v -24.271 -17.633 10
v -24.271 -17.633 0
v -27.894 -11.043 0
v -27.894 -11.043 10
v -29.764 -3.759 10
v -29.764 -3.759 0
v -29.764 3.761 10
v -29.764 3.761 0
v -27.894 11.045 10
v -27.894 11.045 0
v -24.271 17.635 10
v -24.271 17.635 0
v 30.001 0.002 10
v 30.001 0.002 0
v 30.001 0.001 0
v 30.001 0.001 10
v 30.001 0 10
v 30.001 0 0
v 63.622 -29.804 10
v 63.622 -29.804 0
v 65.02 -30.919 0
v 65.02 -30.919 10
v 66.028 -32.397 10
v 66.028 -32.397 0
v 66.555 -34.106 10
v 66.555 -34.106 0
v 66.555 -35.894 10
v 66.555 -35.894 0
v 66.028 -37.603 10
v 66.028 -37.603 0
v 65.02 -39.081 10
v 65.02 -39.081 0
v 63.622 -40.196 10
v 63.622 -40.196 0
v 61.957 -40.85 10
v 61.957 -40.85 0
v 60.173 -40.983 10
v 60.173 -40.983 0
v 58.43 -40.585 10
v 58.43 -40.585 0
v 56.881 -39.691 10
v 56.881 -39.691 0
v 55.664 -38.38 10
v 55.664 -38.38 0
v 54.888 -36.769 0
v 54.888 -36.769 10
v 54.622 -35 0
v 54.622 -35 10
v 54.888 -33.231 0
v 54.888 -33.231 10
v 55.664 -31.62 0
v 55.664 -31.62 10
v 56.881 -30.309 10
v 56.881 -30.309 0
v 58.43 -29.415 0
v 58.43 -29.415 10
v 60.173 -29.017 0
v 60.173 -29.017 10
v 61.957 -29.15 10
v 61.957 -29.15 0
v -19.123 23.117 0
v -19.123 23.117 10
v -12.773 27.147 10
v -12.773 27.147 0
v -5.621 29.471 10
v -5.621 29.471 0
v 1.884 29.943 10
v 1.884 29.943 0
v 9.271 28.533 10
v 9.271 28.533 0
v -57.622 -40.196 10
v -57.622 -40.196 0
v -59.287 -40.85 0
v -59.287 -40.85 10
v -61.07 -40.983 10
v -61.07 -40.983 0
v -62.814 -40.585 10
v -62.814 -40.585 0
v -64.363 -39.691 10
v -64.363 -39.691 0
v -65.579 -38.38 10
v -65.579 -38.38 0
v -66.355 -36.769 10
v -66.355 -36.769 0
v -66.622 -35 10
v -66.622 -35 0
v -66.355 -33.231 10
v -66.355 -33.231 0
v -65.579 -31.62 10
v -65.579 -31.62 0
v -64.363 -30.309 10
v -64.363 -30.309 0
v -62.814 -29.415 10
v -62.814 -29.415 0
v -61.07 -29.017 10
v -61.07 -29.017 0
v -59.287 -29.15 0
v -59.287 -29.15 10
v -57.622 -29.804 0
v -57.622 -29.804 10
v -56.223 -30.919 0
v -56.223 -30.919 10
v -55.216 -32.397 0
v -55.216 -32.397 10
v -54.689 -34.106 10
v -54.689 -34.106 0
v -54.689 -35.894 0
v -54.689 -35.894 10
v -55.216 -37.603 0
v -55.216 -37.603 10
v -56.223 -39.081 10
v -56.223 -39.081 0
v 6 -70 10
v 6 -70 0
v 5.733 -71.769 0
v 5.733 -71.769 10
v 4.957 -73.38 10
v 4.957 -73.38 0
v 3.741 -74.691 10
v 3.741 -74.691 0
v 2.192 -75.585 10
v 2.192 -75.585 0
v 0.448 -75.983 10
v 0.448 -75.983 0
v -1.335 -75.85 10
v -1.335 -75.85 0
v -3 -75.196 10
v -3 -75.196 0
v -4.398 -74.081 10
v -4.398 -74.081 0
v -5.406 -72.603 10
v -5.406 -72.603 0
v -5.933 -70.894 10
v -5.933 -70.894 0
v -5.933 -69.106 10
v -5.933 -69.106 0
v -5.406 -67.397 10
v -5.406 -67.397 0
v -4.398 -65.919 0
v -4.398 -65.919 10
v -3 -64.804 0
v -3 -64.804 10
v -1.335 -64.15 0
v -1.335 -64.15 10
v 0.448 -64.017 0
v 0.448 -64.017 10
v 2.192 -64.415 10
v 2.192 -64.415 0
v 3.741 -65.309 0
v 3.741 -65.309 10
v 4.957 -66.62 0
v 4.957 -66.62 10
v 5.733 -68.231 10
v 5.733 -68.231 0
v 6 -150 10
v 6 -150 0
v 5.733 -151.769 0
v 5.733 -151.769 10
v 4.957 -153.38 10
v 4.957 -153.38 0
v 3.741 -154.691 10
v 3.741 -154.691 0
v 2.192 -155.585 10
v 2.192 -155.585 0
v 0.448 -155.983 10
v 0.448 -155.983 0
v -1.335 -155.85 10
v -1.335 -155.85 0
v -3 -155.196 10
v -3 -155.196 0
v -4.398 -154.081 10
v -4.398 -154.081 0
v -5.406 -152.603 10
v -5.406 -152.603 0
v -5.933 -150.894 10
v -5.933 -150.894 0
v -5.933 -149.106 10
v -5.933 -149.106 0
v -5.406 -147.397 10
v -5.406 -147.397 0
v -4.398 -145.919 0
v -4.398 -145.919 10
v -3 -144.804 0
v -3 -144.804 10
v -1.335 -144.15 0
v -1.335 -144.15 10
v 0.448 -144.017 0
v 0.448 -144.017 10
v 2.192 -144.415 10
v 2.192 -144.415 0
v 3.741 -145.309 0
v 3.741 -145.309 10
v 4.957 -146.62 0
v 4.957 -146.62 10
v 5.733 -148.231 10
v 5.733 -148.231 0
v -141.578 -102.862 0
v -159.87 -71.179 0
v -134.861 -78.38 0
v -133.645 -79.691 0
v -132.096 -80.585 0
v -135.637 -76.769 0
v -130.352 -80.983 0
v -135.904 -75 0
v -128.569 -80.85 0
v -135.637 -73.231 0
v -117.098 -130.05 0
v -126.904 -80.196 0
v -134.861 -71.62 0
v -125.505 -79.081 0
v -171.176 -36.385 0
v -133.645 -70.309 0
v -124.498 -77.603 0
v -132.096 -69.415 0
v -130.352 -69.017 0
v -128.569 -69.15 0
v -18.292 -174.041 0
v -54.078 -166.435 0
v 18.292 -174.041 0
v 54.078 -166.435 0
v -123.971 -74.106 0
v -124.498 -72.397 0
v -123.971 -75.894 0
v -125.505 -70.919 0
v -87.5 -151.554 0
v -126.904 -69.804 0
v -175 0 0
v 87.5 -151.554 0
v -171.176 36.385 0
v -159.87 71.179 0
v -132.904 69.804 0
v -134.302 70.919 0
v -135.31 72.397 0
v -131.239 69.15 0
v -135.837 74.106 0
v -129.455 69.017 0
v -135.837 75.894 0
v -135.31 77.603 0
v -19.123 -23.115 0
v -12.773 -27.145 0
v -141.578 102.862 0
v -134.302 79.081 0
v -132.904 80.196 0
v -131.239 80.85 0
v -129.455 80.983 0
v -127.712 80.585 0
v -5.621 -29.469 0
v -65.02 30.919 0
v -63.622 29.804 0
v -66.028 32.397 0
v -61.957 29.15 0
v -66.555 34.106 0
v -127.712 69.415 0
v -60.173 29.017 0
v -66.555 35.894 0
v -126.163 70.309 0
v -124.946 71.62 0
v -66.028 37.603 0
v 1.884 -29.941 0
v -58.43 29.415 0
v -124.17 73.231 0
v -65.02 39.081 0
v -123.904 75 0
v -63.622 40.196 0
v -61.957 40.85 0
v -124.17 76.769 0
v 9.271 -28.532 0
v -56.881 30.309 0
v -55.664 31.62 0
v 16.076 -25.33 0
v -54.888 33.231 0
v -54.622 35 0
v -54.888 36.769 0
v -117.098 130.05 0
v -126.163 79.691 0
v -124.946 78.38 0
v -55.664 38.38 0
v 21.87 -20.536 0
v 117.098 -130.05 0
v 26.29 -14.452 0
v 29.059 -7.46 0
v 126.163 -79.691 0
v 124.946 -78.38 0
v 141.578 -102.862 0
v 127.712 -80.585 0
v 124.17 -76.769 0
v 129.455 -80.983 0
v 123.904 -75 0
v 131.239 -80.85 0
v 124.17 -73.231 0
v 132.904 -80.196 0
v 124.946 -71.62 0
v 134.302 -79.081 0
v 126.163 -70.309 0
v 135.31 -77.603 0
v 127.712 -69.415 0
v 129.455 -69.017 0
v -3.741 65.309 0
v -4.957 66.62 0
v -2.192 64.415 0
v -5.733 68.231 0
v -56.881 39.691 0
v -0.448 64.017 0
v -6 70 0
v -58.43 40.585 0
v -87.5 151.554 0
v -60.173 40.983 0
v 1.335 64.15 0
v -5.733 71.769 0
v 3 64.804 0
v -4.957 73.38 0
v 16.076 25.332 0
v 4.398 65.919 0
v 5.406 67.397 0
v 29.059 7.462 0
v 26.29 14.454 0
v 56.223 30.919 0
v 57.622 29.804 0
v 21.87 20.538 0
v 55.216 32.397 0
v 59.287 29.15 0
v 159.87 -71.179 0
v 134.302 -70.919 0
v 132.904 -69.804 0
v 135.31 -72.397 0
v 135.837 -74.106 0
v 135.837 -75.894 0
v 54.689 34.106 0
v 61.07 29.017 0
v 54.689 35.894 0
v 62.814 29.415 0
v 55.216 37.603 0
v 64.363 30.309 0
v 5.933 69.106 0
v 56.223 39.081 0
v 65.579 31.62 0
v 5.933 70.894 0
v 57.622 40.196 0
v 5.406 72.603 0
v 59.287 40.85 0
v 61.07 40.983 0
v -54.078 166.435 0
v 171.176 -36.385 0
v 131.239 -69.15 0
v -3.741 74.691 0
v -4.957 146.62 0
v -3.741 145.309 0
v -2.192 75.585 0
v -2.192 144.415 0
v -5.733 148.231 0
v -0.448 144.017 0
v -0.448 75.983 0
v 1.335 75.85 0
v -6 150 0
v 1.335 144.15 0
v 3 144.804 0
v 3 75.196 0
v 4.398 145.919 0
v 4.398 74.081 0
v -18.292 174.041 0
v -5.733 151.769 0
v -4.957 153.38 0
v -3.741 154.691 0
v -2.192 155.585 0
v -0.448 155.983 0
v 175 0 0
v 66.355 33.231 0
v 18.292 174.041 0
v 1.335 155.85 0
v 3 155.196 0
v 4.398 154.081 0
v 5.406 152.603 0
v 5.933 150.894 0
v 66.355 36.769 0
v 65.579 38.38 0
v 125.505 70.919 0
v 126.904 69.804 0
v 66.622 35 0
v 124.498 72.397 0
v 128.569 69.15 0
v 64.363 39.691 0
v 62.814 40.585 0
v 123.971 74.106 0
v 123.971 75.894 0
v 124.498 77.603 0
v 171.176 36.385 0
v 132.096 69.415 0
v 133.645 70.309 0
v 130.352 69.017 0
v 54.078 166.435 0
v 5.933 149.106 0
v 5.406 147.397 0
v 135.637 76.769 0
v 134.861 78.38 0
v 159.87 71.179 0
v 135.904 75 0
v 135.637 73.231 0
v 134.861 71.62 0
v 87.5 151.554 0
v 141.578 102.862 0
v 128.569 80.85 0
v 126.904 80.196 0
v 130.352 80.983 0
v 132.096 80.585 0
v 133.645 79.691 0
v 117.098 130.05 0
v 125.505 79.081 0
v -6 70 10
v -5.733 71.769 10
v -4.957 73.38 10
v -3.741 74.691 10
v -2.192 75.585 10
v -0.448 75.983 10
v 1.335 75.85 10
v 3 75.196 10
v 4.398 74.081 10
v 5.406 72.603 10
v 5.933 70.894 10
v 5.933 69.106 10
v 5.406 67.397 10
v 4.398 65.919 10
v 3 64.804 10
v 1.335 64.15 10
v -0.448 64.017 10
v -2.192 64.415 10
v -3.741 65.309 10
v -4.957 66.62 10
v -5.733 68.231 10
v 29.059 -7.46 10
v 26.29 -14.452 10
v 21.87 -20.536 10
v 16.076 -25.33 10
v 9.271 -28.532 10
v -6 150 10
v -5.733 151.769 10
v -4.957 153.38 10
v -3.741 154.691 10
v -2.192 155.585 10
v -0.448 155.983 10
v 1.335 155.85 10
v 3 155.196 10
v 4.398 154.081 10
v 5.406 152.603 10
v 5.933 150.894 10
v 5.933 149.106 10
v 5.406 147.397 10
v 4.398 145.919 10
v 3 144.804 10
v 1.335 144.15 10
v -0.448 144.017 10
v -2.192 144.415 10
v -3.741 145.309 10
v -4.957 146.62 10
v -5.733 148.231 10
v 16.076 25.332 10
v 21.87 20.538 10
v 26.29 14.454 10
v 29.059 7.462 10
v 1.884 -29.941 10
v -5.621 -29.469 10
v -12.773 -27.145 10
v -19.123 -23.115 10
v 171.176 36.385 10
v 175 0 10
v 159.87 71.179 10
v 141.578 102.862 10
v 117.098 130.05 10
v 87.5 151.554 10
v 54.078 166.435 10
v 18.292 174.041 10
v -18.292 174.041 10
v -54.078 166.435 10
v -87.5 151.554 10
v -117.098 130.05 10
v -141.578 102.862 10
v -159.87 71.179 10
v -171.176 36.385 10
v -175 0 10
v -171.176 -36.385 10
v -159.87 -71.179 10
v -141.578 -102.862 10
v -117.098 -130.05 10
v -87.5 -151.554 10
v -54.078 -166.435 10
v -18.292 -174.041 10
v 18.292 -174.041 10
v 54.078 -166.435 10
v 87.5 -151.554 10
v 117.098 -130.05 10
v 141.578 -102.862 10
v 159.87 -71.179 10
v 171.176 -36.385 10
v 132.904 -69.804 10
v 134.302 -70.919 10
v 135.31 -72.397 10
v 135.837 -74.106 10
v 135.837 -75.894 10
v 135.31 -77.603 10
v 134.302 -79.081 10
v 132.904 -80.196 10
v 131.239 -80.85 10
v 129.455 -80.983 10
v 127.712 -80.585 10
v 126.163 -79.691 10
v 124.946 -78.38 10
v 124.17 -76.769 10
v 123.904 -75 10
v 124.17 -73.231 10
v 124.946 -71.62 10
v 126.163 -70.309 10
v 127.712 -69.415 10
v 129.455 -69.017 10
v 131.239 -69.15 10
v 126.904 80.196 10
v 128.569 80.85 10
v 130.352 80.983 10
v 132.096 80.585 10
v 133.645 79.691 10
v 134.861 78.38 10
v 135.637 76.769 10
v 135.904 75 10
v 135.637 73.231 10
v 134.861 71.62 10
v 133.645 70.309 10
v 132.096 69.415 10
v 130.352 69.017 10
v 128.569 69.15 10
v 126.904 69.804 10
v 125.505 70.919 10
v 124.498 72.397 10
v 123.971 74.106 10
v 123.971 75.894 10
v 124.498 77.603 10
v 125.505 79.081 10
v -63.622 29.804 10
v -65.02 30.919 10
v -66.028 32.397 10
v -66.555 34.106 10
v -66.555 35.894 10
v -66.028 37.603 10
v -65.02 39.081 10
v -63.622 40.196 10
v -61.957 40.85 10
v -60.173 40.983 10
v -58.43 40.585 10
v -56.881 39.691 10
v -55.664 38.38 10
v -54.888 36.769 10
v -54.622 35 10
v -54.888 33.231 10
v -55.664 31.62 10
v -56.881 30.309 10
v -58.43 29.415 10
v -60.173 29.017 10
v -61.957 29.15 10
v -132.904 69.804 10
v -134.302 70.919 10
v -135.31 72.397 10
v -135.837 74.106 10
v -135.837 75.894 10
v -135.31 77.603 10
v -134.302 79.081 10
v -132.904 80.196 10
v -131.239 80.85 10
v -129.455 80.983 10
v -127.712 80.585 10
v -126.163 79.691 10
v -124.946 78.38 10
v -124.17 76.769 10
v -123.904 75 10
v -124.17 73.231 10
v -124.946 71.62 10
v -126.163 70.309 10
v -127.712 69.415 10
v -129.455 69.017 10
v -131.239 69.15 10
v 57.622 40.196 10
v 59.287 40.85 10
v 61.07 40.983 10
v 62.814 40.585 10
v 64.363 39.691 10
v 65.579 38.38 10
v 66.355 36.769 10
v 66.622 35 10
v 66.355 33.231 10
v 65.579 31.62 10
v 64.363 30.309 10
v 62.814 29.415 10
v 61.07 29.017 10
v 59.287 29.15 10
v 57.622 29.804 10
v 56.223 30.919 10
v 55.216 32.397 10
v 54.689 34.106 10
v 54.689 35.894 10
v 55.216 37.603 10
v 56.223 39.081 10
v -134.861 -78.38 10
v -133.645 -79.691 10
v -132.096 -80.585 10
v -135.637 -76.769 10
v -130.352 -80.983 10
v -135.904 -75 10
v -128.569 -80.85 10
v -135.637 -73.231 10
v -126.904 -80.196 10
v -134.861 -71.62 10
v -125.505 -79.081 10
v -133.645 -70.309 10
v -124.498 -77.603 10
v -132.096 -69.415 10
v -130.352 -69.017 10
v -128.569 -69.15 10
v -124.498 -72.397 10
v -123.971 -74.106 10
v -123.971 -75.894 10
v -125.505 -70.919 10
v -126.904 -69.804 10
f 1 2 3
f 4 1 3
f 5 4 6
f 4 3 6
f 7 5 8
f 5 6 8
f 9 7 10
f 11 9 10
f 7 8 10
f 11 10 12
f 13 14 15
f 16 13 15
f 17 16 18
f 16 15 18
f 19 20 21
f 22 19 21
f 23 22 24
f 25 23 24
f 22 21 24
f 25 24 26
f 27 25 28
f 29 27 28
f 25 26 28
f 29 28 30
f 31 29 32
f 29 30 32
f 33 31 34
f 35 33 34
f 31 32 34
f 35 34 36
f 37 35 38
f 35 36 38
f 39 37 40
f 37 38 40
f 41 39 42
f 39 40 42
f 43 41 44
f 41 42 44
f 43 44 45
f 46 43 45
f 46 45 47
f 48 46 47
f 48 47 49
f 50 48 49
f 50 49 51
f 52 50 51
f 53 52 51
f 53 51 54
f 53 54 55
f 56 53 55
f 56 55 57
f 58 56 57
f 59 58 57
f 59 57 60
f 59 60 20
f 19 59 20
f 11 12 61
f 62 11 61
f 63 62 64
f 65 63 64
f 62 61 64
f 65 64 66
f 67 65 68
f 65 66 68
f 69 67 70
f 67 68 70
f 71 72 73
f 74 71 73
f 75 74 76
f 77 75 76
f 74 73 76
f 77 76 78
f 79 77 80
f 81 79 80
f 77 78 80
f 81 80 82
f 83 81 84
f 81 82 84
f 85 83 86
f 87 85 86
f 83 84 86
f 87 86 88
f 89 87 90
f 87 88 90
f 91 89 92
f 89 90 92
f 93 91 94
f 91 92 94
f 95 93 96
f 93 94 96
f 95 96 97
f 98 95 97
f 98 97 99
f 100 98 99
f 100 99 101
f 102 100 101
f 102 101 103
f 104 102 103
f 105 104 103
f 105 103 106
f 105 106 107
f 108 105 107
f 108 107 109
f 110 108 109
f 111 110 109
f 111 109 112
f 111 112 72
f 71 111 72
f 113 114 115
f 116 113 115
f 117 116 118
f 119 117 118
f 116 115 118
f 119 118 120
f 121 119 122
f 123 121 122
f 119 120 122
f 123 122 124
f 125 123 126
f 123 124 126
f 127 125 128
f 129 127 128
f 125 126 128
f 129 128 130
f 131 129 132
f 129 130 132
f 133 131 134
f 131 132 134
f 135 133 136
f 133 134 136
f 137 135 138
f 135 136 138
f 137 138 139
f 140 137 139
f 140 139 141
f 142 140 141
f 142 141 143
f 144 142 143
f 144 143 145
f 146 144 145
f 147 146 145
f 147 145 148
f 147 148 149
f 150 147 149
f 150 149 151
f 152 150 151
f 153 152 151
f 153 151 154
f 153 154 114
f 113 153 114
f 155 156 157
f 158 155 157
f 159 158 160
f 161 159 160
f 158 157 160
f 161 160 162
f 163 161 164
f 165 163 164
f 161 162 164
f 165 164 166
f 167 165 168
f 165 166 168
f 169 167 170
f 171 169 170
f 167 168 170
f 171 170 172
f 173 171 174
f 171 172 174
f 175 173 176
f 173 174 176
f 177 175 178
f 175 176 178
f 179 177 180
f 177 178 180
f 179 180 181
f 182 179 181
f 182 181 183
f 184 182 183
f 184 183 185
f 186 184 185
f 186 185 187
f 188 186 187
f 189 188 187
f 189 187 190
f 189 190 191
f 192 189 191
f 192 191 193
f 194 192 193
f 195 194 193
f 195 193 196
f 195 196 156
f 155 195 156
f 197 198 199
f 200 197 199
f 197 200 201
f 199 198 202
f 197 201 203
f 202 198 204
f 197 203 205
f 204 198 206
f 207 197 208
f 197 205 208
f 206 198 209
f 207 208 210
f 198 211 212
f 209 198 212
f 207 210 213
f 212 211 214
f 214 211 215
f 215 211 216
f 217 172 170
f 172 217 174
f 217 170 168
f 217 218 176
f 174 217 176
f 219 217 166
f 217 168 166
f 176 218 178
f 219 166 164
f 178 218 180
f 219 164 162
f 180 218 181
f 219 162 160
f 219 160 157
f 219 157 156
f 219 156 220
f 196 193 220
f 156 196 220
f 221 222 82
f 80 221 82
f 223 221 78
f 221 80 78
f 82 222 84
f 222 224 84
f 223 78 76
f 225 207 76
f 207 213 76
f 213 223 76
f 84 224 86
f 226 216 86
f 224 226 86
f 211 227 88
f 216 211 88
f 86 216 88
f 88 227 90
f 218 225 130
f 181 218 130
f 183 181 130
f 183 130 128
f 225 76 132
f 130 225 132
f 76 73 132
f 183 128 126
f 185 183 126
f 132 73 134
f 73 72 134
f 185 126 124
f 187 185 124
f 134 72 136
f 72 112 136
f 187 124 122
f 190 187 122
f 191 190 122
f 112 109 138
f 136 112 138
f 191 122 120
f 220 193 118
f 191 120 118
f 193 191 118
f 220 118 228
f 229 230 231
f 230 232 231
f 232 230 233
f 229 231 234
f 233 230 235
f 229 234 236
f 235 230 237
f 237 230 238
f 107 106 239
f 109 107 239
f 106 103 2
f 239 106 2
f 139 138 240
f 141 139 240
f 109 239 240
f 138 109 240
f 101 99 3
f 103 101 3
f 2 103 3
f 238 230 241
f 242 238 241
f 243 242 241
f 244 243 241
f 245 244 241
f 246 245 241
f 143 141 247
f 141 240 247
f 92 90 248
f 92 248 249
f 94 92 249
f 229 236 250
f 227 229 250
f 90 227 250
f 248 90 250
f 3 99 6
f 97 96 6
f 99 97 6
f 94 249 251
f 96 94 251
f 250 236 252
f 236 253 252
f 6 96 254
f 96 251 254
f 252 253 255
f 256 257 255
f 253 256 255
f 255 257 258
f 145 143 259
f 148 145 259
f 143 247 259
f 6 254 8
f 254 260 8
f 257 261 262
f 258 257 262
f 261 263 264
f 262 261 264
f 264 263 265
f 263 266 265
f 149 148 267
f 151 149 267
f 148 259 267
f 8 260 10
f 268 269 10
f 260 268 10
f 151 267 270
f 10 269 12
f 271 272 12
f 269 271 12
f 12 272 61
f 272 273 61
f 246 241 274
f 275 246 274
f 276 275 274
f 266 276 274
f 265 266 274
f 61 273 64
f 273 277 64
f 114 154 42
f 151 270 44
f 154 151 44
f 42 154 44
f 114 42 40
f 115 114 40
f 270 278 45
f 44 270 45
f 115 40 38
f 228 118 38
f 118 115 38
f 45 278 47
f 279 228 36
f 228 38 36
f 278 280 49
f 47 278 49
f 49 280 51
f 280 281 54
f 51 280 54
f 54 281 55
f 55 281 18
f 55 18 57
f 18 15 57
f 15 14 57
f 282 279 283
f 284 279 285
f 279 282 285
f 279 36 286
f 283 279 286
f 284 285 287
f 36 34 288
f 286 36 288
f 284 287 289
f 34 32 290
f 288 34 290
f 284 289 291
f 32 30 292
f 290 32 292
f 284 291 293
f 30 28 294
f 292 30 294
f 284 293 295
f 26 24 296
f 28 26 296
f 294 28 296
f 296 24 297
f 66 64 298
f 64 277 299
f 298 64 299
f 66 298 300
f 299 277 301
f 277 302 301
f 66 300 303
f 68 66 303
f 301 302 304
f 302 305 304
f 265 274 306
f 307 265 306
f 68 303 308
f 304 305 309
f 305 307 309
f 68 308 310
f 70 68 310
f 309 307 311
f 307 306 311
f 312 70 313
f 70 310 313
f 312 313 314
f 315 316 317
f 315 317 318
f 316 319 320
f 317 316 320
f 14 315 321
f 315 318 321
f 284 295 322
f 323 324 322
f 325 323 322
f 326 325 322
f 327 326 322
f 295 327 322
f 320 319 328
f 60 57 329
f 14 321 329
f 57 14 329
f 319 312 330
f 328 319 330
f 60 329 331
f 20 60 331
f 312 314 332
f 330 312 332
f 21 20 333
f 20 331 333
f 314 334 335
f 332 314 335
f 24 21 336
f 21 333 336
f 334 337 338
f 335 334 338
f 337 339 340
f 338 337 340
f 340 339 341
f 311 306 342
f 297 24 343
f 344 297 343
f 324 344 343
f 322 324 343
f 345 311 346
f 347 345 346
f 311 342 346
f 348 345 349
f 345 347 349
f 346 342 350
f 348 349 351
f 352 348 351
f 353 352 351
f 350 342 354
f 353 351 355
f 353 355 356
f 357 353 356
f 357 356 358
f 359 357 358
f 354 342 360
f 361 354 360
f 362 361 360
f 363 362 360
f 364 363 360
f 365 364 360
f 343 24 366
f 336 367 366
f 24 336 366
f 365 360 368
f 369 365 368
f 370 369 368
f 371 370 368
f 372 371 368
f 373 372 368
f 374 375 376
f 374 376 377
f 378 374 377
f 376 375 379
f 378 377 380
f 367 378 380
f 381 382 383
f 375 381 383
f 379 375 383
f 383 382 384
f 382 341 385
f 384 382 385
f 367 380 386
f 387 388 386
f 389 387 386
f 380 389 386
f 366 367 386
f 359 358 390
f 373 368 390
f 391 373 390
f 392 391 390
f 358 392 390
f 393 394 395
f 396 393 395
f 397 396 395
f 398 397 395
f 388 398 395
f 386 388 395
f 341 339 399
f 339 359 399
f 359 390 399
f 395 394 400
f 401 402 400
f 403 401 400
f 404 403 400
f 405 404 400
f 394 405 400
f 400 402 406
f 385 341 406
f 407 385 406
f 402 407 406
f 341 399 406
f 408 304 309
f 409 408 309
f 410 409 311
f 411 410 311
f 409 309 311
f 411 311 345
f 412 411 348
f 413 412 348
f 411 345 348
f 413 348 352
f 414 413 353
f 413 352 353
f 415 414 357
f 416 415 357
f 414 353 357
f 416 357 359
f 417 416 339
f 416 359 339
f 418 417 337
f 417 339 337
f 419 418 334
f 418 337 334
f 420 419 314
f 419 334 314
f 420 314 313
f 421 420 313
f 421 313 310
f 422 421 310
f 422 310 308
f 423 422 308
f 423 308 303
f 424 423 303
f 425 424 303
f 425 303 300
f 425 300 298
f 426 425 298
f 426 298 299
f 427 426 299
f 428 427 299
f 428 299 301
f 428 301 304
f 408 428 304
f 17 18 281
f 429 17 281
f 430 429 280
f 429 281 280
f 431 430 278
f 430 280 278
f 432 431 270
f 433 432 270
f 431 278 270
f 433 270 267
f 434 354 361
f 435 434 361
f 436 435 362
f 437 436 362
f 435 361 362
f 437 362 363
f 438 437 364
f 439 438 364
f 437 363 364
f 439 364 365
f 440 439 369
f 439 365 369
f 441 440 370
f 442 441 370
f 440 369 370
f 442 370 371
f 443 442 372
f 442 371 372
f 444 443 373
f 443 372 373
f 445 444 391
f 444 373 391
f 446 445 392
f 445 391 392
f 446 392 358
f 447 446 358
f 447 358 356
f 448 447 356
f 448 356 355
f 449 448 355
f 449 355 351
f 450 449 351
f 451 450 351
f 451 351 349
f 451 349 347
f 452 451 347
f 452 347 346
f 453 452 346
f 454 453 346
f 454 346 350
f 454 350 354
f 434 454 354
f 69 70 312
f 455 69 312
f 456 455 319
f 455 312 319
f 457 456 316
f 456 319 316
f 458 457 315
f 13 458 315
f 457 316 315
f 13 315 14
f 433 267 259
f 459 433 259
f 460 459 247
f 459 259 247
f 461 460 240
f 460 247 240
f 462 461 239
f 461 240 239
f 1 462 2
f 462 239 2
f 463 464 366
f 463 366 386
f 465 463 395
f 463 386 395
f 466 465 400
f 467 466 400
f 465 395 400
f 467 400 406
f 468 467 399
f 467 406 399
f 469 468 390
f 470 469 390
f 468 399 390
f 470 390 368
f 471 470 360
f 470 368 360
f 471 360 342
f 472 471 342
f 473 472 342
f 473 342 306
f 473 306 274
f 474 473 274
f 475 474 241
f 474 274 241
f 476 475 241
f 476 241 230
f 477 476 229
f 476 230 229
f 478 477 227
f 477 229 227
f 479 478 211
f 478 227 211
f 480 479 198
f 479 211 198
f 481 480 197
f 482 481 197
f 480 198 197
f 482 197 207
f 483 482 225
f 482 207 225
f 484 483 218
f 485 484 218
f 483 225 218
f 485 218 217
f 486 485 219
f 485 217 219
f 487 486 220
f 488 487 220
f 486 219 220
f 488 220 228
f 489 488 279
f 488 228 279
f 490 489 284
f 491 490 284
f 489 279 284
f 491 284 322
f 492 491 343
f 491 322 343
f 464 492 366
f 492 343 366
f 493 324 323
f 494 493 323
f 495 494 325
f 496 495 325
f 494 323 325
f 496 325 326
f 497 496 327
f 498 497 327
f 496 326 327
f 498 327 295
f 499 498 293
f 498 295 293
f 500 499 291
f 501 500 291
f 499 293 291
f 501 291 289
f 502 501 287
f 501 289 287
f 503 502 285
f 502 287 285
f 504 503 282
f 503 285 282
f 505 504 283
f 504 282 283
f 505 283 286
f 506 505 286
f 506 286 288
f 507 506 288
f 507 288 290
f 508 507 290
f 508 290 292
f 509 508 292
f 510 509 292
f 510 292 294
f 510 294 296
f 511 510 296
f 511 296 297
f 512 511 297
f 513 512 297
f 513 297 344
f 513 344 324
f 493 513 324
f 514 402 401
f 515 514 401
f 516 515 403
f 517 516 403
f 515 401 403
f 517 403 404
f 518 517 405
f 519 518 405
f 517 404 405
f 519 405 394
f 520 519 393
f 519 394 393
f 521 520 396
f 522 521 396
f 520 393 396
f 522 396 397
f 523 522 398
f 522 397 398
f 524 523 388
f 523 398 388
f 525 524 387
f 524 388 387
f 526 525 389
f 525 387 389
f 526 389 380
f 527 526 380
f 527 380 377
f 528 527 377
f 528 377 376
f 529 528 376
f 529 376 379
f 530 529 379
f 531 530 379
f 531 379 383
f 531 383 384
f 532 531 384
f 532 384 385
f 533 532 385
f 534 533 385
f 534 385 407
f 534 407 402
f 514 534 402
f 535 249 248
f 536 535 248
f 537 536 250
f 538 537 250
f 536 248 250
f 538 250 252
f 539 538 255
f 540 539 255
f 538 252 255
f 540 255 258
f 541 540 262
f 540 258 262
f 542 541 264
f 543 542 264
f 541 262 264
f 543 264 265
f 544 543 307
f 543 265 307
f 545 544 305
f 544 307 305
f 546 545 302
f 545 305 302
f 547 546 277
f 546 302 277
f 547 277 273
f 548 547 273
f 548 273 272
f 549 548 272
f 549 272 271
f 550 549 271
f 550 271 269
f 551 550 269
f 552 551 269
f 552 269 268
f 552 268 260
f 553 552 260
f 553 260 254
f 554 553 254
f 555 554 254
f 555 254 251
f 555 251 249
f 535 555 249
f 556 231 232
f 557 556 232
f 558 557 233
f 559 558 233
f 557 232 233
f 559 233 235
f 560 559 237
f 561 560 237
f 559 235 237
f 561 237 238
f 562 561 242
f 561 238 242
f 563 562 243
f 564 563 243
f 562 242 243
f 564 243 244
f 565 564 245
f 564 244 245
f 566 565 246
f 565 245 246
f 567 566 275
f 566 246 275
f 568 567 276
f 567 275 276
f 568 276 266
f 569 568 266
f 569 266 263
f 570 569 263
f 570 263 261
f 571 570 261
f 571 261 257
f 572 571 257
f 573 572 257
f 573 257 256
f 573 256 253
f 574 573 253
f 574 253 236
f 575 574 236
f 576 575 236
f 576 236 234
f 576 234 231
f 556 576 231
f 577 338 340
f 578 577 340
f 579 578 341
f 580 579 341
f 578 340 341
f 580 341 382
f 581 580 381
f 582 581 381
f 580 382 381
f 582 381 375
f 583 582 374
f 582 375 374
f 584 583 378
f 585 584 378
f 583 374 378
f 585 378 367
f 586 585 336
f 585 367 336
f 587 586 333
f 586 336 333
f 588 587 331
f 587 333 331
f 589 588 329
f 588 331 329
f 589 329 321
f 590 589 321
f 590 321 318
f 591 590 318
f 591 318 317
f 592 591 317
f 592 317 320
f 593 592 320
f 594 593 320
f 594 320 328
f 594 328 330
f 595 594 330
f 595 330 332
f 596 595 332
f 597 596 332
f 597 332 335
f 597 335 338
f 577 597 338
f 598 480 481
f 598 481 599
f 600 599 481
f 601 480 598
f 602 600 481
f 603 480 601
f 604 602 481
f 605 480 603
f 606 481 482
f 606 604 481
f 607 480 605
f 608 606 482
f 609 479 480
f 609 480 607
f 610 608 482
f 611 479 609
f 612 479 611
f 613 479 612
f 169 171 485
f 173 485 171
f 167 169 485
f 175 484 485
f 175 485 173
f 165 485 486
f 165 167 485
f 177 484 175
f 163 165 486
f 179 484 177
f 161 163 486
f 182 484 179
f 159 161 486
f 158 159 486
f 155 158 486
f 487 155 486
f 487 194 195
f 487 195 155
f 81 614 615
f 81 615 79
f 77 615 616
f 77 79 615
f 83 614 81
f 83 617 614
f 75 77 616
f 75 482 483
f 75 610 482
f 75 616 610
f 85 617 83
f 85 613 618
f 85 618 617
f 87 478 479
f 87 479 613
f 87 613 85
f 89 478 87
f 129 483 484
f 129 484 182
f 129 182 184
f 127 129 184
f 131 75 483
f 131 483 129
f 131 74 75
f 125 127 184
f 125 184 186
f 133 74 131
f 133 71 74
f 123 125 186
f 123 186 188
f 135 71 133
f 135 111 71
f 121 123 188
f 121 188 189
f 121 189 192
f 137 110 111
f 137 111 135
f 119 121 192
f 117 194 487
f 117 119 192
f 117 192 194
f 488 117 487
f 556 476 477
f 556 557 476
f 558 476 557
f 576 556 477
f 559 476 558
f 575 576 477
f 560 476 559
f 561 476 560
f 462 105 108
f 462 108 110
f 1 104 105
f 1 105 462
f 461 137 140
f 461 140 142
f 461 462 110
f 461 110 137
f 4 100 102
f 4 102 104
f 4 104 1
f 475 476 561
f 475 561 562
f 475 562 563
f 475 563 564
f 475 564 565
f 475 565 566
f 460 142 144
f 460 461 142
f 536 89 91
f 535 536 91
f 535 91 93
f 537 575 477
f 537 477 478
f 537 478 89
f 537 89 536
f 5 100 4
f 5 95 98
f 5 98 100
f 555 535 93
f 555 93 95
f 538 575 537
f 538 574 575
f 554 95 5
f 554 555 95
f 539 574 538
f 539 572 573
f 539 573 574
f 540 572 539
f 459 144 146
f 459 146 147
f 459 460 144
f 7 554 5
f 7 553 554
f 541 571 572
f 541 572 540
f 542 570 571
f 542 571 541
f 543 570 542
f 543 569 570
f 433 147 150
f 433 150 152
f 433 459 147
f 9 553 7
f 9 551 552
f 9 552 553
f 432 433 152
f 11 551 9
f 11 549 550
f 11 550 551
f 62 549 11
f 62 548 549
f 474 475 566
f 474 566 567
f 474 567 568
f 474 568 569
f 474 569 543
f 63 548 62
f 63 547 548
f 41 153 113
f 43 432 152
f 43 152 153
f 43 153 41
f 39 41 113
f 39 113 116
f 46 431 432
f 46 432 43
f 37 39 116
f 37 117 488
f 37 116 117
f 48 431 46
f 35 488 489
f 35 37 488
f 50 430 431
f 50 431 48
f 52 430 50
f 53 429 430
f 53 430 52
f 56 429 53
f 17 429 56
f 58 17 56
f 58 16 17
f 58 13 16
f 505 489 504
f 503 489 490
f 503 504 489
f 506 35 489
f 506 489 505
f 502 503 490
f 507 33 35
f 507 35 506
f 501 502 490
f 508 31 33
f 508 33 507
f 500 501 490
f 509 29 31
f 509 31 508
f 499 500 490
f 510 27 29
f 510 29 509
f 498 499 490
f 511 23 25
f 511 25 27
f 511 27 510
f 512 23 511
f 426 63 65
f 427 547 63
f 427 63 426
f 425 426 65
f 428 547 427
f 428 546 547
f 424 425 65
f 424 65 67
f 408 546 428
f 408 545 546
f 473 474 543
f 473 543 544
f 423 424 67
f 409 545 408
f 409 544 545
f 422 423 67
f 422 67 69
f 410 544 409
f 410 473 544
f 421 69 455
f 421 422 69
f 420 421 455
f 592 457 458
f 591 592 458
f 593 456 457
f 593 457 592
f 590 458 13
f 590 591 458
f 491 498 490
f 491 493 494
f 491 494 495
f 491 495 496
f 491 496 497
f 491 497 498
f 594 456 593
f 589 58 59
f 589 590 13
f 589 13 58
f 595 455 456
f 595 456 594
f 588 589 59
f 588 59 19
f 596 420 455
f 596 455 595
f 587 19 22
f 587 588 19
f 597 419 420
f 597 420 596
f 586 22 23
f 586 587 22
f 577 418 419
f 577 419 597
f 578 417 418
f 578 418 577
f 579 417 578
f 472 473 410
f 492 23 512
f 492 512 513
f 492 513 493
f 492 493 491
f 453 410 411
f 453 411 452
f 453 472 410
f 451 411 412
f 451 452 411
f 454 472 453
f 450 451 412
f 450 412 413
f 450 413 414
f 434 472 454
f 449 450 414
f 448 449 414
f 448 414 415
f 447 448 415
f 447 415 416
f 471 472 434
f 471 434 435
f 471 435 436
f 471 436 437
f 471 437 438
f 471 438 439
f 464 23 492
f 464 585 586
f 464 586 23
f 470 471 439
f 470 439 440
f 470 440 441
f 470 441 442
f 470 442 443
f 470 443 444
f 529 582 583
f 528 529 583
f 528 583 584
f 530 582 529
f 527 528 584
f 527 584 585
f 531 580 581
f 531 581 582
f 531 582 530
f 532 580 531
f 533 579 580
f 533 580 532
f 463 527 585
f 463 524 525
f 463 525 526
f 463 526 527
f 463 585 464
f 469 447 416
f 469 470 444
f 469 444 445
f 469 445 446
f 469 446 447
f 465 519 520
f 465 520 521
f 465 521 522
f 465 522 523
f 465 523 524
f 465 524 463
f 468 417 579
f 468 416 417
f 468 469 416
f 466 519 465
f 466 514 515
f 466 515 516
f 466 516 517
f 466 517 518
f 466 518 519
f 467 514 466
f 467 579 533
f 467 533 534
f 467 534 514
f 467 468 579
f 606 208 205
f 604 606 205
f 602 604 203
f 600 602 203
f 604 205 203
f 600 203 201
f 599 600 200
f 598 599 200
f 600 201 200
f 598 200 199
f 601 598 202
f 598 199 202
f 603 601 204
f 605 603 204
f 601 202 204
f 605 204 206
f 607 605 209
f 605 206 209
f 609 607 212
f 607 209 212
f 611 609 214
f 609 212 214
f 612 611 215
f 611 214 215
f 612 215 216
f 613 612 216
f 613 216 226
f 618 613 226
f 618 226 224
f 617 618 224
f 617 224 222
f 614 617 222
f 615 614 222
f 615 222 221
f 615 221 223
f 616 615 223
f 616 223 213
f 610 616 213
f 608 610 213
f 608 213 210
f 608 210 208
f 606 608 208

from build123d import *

# Parameters (mm, degrees)
SKETCH1_R           = 175
BOSS_EXTRUDE2_DEPTH = 10
SKETCH2_R           = 6
CUT_EXTRUDE1_DEPTH  = 248.68932153
CIRPATTERN2_COUNT   = 6


with BuildPart() as part:
    # Sketch1 → Boss-Extrude2 (new body)
    with BuildSketch(Plane.XY):
        Circle(SKETCH1_R)
        with BuildLine():
            ThreePointArc((30.001118034, 0.000363271), (24.271455118, -17.633432061), (9.271068846, -28.531513848))
            ThreePointArc((9.271068846, -28.531513848), (-9.270509831, -28.531695489), (-24.270855318, -17.633082037))
            ThreePointArc((-24.270855318, -17.633082037), (-30.000690983, 0.000951057), (-24.270855318, 17.63498415))
            ThreePointArc((-24.270855318, 17.63498415), (-9.270509831, 28.533597602), (9.271068846, 28.533415961))
            ThreePointArc((9.271068846, 28.533415961), (24.271455118, 17.635334174), (30.001118034, 0.001538842))
            ThreePointArc((30.001118034, 0.001538842), (30.001118028, 0.000951057), (30.001118011, 0.000363271))
        make_face(mode=Mode.SUBTRACT)
    extrude(amount=BOSS_EXTRUDE2_DEPTH)

    # Sketch2 → Cut-Extrude1 (cut, through all)
    with BuildSketch(Plane(origin=(0, 0, 0), x_dir=(-1, 0, 0), z_dir=(0, 0, -1))):
        with Locations((0, 70)):
            Circle(SKETCH2_R)
        with Locations((0, 150)):
            Circle(SKETCH2_R)
    cut_extrude1 = extrude(amount=-CUT_EXTRUDE1_DEPTH, mode=Mode.SUBTRACT)

    # CirPattern2: Cut-Extrude1 ×6 about axis
    cirpattern2_axis = Axis((0, 0, 0), (0, 0, 1))
    for i in range(1, CIRPATTERN2_COUNT):
        add(cut_extrude1.rotate(cirpattern2_axis, i * 360 / CIRPATTERN2_COUNT), mode=Mode.SUBTRACT)


solid = part.part
